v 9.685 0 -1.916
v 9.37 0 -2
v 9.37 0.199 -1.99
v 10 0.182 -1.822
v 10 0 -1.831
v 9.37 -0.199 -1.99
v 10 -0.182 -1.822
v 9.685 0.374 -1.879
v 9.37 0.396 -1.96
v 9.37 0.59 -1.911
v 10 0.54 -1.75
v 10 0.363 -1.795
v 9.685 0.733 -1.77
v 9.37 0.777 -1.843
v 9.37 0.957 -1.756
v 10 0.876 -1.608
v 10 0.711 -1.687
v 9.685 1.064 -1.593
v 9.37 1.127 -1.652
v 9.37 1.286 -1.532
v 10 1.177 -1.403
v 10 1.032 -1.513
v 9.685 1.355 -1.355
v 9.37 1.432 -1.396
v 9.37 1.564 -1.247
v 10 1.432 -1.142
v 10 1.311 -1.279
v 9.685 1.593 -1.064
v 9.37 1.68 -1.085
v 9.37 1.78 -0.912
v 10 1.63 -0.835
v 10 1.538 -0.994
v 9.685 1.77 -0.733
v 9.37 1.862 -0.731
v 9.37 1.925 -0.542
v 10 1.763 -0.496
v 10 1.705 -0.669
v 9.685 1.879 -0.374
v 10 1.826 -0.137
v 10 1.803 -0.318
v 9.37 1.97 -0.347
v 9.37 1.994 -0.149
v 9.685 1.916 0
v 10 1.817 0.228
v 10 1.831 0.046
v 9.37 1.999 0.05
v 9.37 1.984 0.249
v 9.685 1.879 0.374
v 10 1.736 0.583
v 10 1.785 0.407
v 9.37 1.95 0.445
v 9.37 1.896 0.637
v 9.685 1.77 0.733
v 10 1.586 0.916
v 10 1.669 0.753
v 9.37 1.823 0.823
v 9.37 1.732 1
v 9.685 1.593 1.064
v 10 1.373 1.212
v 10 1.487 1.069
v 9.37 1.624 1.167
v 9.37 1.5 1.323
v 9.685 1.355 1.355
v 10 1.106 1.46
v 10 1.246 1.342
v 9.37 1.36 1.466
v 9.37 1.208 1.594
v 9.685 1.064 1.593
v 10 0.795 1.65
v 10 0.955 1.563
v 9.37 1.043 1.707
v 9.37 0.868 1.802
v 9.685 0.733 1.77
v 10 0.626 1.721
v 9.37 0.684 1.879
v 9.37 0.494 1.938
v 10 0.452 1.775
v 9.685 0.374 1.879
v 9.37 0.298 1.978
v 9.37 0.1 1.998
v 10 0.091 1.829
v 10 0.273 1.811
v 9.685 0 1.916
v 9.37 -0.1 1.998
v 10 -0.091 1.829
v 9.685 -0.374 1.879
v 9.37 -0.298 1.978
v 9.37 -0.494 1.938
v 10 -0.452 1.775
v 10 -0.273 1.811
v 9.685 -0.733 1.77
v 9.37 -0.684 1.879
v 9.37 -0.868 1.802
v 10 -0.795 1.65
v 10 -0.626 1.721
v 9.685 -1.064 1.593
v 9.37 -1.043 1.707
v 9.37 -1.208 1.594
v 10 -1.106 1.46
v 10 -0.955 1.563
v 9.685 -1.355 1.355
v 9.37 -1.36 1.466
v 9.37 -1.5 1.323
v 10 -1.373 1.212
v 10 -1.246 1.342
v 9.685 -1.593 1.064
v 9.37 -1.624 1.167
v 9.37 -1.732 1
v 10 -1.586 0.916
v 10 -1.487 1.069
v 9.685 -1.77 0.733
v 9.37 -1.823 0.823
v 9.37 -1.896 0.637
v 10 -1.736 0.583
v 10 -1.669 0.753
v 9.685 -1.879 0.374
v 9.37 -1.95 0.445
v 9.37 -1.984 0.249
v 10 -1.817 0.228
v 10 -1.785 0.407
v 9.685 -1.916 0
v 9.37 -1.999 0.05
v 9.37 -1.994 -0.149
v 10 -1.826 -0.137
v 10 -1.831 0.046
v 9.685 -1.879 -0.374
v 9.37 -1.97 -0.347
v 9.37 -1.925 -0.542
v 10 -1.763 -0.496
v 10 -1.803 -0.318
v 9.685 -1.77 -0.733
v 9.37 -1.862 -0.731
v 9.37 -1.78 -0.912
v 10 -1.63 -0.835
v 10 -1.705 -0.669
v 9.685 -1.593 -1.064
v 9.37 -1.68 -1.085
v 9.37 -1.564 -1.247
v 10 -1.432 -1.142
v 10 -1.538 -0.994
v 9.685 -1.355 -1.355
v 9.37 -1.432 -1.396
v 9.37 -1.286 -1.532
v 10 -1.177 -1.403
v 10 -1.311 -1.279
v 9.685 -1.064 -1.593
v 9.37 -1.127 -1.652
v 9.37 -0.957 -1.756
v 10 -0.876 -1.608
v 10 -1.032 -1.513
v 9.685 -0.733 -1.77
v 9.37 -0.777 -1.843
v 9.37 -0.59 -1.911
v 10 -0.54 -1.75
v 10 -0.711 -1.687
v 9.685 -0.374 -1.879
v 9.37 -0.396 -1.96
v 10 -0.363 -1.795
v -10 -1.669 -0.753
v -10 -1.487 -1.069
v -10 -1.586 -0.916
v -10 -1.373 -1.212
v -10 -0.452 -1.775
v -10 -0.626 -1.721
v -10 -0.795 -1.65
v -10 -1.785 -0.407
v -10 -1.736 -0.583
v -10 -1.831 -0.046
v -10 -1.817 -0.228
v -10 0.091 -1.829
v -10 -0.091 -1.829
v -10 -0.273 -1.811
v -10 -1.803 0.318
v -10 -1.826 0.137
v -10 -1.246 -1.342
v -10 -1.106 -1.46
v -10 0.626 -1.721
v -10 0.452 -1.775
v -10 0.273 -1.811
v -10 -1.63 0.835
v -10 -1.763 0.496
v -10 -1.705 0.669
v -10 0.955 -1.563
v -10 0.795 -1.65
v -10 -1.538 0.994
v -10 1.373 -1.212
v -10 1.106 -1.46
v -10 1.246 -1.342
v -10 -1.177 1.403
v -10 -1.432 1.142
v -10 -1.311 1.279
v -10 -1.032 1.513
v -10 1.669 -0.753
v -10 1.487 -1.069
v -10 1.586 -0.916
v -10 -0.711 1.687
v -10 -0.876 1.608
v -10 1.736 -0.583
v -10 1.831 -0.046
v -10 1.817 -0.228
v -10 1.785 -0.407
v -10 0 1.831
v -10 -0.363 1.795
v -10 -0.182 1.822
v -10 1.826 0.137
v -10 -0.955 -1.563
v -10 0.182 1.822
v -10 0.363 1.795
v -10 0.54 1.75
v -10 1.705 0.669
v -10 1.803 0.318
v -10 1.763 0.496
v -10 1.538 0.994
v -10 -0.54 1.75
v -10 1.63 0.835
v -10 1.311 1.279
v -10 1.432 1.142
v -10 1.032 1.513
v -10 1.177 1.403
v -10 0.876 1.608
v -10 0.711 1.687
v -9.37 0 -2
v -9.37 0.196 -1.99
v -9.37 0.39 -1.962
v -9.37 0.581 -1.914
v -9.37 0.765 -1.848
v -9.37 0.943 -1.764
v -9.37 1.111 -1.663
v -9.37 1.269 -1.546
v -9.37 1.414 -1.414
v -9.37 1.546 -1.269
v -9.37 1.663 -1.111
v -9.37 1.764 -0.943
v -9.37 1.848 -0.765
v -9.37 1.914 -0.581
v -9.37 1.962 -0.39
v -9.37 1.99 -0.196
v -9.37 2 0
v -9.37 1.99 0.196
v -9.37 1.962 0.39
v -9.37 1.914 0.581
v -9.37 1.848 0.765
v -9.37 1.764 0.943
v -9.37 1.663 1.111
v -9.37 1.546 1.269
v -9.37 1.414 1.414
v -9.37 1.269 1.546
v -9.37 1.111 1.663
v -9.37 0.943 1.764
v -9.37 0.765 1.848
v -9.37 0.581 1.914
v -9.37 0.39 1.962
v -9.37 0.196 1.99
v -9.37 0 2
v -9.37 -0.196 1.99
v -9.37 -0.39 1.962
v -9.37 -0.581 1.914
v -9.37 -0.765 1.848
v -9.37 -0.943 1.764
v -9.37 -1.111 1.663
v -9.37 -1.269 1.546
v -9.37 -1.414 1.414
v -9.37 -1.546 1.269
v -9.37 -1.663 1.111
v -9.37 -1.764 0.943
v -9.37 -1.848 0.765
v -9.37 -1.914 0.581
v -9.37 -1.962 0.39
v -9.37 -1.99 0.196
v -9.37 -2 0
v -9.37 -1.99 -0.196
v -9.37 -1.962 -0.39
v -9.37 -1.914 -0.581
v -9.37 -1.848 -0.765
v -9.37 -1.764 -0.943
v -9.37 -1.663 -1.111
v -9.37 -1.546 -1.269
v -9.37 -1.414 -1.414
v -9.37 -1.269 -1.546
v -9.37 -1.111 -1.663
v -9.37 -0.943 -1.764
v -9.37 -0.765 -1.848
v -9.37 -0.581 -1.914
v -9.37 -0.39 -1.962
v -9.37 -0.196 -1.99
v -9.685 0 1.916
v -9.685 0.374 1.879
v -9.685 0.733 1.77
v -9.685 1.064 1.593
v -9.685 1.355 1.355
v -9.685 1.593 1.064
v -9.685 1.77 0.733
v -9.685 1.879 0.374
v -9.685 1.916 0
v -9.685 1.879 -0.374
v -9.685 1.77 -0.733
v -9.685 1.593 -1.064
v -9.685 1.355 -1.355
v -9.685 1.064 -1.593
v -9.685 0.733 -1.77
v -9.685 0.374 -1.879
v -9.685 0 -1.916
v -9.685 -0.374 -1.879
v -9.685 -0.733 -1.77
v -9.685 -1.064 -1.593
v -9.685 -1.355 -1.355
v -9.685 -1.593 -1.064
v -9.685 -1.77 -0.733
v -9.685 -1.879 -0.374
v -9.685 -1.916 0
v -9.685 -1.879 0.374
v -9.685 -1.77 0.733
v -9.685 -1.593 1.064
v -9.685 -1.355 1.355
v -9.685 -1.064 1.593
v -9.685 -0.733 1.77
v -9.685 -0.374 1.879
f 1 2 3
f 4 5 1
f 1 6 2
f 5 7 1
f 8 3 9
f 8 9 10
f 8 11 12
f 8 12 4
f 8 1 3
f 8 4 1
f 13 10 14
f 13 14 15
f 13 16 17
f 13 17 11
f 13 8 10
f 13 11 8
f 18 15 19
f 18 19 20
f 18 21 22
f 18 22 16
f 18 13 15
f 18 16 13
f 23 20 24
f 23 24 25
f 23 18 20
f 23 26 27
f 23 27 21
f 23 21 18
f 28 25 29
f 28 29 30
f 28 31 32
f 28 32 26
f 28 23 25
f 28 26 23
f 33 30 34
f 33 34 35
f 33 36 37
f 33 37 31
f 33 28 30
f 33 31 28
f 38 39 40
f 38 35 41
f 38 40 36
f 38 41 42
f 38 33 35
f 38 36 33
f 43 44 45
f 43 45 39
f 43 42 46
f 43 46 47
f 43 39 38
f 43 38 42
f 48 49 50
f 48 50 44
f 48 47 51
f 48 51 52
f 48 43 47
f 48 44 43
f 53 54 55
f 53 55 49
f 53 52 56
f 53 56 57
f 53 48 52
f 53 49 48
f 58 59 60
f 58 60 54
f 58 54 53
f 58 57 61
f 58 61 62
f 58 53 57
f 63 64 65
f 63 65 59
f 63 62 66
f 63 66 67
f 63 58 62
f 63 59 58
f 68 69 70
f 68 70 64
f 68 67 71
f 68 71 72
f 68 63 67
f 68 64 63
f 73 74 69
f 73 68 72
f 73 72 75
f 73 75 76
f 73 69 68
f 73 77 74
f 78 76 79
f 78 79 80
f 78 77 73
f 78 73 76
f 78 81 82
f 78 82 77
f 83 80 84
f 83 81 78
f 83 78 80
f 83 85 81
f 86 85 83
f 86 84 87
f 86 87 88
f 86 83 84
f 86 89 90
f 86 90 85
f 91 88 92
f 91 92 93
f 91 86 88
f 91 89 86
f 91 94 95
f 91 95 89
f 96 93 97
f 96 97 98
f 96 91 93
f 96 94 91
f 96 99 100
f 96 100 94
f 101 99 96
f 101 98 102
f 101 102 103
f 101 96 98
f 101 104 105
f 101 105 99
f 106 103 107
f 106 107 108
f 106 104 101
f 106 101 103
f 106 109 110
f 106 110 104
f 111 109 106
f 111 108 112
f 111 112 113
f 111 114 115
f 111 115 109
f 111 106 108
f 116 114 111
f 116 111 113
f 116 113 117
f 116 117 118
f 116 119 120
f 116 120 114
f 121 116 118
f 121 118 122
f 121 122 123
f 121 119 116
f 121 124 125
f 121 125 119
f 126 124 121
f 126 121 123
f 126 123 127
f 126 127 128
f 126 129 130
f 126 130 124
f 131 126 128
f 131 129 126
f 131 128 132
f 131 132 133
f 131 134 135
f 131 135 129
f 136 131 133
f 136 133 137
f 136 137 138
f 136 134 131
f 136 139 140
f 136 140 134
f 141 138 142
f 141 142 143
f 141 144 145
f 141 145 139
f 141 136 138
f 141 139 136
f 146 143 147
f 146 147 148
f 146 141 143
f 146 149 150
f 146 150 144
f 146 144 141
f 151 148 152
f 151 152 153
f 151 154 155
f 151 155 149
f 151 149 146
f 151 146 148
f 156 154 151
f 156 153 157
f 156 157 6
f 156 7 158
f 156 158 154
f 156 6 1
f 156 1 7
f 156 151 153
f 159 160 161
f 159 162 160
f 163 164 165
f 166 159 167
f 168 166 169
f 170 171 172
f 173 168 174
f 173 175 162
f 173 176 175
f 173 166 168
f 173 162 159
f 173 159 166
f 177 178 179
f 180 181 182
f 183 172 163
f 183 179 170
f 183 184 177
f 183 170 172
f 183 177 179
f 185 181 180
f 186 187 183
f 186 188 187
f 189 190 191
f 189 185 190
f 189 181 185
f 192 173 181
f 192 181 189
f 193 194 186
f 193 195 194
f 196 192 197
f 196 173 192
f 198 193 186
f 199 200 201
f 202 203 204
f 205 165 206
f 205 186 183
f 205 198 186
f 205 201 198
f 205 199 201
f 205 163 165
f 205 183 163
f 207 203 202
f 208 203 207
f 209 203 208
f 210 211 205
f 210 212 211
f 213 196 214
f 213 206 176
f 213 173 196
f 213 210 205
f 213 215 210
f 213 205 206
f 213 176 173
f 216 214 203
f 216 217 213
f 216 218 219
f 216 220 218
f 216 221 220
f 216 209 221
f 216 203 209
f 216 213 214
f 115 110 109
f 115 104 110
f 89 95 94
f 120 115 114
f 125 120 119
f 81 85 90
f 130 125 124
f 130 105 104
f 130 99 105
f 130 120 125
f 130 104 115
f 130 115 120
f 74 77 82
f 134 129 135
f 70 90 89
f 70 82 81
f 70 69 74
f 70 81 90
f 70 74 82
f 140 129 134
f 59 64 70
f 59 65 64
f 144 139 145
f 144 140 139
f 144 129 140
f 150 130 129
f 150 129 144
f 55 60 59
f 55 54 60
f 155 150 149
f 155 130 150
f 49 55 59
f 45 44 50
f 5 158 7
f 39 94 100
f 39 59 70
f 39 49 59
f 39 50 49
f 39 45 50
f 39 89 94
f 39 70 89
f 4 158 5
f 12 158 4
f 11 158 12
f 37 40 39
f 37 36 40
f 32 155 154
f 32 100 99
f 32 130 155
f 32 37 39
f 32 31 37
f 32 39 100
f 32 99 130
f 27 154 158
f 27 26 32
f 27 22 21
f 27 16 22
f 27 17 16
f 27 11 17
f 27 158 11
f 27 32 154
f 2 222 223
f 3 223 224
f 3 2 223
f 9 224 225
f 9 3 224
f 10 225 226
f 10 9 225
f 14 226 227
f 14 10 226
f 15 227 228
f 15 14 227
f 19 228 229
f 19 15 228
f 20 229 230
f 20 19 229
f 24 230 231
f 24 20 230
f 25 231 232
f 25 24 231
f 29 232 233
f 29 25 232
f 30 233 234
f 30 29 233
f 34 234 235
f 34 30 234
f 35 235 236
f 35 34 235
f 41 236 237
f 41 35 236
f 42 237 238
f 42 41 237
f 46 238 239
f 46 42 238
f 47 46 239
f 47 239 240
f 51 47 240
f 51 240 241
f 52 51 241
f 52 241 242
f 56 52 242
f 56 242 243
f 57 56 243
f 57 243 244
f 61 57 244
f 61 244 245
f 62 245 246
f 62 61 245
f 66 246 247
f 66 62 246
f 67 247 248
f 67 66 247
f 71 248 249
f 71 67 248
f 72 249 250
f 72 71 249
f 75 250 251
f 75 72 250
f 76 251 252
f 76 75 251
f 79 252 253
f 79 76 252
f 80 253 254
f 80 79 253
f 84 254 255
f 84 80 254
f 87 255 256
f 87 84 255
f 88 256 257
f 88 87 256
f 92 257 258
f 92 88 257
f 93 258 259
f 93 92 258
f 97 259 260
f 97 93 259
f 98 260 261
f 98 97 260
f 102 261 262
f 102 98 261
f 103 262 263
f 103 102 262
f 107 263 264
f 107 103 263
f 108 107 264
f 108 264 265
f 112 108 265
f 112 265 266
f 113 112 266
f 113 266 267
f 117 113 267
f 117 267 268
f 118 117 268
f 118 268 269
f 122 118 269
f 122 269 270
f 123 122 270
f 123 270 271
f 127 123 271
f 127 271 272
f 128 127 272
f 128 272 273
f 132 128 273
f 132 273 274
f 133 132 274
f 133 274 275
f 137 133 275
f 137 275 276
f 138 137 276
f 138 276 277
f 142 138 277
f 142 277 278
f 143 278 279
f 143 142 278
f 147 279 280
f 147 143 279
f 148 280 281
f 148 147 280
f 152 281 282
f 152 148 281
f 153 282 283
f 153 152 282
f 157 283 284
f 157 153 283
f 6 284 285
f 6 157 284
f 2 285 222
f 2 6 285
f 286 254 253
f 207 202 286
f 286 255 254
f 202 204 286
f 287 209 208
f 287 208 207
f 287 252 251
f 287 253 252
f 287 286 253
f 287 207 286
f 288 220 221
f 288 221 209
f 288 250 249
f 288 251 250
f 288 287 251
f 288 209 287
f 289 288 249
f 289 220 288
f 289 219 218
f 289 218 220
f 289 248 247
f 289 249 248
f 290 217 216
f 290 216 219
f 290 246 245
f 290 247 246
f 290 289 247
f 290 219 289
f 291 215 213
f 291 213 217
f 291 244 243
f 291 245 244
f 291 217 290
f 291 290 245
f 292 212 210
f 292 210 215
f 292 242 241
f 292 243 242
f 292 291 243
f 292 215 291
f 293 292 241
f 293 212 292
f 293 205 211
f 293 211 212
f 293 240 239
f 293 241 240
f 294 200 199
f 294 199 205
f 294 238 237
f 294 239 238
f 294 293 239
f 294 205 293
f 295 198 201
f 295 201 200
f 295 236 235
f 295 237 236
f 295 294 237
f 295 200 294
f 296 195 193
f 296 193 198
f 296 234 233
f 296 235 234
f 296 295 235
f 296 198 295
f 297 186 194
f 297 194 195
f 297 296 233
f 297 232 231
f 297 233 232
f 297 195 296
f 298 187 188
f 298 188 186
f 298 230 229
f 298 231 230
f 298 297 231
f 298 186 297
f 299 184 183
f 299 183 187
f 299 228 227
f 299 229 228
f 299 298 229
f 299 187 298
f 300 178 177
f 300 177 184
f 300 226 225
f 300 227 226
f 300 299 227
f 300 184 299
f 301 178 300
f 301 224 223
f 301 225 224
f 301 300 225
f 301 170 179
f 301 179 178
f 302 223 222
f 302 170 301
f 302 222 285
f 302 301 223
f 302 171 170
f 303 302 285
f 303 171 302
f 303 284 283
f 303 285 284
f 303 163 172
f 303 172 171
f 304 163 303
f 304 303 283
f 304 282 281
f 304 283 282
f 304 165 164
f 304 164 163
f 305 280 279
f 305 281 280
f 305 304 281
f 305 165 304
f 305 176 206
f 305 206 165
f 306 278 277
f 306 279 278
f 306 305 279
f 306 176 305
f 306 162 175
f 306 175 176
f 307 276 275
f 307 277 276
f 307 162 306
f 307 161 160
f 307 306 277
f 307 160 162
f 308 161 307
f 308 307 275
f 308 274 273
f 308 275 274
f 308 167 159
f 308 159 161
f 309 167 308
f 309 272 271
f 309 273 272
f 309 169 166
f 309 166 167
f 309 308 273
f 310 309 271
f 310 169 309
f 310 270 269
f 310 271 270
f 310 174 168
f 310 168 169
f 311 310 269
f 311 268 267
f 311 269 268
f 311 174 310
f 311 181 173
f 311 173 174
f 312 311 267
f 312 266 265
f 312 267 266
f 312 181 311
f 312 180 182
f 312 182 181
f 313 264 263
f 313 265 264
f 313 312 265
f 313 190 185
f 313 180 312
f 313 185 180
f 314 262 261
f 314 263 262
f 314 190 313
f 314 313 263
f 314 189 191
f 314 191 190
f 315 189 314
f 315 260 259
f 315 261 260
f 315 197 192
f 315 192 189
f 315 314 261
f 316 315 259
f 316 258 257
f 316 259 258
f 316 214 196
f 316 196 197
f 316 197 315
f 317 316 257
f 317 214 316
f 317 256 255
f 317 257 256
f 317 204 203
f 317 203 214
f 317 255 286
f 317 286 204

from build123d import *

# Parameters (mm, degrees)
SKETCH2_R           = 2
EXTRUDE1_DEPTH      = 9.37
EXTRUDE1_DEPTH_BACK = 9.37
SKETCH3_R           = 2
EXTRUDE2_DEPTH      = 0.63
EXTRUDE2_TAPER      = 15
SKETCH4_R           = 2
EXTRUDE3_DEPTH      = 0.63
EXTRUDE3_TAPER      = 15


with BuildPart() as part:
    # Sketch2 → Extrude1 (new body, two sides)
    with BuildSketch(Plane(origin=(0, 0, 0), x_dir=(0, 0, -1), z_dir=(1, 0, 0))) as extrude1_sk:
        Circle(SKETCH2_R)
    extrude(amount=EXTRUDE1_DEPTH)
    extrude(extrude1_sk.sketch, amount=-EXTRUDE1_DEPTH_BACK)

    # Sketch3 → Extrude2 (add)
    with BuildSketch(Plane(origin=(9.37, 0, 0), x_dir=(0, 0, -1), z_dir=(1, 0, 0))):
        Circle(SKETCH3_R)
    extrude(amount=EXTRUDE2_DEPTH, taper=EXTRUDE2_TAPER)

    # Sketch4 → Extrude3 (add)
    with BuildSketch(Plane.ZY.offset(9.37)):
        Circle(SKETCH4_R)
    extrude(amount=EXTRUDE3_DEPTH, taper=EXTRUDE3_TAPER)


solid = part.part
